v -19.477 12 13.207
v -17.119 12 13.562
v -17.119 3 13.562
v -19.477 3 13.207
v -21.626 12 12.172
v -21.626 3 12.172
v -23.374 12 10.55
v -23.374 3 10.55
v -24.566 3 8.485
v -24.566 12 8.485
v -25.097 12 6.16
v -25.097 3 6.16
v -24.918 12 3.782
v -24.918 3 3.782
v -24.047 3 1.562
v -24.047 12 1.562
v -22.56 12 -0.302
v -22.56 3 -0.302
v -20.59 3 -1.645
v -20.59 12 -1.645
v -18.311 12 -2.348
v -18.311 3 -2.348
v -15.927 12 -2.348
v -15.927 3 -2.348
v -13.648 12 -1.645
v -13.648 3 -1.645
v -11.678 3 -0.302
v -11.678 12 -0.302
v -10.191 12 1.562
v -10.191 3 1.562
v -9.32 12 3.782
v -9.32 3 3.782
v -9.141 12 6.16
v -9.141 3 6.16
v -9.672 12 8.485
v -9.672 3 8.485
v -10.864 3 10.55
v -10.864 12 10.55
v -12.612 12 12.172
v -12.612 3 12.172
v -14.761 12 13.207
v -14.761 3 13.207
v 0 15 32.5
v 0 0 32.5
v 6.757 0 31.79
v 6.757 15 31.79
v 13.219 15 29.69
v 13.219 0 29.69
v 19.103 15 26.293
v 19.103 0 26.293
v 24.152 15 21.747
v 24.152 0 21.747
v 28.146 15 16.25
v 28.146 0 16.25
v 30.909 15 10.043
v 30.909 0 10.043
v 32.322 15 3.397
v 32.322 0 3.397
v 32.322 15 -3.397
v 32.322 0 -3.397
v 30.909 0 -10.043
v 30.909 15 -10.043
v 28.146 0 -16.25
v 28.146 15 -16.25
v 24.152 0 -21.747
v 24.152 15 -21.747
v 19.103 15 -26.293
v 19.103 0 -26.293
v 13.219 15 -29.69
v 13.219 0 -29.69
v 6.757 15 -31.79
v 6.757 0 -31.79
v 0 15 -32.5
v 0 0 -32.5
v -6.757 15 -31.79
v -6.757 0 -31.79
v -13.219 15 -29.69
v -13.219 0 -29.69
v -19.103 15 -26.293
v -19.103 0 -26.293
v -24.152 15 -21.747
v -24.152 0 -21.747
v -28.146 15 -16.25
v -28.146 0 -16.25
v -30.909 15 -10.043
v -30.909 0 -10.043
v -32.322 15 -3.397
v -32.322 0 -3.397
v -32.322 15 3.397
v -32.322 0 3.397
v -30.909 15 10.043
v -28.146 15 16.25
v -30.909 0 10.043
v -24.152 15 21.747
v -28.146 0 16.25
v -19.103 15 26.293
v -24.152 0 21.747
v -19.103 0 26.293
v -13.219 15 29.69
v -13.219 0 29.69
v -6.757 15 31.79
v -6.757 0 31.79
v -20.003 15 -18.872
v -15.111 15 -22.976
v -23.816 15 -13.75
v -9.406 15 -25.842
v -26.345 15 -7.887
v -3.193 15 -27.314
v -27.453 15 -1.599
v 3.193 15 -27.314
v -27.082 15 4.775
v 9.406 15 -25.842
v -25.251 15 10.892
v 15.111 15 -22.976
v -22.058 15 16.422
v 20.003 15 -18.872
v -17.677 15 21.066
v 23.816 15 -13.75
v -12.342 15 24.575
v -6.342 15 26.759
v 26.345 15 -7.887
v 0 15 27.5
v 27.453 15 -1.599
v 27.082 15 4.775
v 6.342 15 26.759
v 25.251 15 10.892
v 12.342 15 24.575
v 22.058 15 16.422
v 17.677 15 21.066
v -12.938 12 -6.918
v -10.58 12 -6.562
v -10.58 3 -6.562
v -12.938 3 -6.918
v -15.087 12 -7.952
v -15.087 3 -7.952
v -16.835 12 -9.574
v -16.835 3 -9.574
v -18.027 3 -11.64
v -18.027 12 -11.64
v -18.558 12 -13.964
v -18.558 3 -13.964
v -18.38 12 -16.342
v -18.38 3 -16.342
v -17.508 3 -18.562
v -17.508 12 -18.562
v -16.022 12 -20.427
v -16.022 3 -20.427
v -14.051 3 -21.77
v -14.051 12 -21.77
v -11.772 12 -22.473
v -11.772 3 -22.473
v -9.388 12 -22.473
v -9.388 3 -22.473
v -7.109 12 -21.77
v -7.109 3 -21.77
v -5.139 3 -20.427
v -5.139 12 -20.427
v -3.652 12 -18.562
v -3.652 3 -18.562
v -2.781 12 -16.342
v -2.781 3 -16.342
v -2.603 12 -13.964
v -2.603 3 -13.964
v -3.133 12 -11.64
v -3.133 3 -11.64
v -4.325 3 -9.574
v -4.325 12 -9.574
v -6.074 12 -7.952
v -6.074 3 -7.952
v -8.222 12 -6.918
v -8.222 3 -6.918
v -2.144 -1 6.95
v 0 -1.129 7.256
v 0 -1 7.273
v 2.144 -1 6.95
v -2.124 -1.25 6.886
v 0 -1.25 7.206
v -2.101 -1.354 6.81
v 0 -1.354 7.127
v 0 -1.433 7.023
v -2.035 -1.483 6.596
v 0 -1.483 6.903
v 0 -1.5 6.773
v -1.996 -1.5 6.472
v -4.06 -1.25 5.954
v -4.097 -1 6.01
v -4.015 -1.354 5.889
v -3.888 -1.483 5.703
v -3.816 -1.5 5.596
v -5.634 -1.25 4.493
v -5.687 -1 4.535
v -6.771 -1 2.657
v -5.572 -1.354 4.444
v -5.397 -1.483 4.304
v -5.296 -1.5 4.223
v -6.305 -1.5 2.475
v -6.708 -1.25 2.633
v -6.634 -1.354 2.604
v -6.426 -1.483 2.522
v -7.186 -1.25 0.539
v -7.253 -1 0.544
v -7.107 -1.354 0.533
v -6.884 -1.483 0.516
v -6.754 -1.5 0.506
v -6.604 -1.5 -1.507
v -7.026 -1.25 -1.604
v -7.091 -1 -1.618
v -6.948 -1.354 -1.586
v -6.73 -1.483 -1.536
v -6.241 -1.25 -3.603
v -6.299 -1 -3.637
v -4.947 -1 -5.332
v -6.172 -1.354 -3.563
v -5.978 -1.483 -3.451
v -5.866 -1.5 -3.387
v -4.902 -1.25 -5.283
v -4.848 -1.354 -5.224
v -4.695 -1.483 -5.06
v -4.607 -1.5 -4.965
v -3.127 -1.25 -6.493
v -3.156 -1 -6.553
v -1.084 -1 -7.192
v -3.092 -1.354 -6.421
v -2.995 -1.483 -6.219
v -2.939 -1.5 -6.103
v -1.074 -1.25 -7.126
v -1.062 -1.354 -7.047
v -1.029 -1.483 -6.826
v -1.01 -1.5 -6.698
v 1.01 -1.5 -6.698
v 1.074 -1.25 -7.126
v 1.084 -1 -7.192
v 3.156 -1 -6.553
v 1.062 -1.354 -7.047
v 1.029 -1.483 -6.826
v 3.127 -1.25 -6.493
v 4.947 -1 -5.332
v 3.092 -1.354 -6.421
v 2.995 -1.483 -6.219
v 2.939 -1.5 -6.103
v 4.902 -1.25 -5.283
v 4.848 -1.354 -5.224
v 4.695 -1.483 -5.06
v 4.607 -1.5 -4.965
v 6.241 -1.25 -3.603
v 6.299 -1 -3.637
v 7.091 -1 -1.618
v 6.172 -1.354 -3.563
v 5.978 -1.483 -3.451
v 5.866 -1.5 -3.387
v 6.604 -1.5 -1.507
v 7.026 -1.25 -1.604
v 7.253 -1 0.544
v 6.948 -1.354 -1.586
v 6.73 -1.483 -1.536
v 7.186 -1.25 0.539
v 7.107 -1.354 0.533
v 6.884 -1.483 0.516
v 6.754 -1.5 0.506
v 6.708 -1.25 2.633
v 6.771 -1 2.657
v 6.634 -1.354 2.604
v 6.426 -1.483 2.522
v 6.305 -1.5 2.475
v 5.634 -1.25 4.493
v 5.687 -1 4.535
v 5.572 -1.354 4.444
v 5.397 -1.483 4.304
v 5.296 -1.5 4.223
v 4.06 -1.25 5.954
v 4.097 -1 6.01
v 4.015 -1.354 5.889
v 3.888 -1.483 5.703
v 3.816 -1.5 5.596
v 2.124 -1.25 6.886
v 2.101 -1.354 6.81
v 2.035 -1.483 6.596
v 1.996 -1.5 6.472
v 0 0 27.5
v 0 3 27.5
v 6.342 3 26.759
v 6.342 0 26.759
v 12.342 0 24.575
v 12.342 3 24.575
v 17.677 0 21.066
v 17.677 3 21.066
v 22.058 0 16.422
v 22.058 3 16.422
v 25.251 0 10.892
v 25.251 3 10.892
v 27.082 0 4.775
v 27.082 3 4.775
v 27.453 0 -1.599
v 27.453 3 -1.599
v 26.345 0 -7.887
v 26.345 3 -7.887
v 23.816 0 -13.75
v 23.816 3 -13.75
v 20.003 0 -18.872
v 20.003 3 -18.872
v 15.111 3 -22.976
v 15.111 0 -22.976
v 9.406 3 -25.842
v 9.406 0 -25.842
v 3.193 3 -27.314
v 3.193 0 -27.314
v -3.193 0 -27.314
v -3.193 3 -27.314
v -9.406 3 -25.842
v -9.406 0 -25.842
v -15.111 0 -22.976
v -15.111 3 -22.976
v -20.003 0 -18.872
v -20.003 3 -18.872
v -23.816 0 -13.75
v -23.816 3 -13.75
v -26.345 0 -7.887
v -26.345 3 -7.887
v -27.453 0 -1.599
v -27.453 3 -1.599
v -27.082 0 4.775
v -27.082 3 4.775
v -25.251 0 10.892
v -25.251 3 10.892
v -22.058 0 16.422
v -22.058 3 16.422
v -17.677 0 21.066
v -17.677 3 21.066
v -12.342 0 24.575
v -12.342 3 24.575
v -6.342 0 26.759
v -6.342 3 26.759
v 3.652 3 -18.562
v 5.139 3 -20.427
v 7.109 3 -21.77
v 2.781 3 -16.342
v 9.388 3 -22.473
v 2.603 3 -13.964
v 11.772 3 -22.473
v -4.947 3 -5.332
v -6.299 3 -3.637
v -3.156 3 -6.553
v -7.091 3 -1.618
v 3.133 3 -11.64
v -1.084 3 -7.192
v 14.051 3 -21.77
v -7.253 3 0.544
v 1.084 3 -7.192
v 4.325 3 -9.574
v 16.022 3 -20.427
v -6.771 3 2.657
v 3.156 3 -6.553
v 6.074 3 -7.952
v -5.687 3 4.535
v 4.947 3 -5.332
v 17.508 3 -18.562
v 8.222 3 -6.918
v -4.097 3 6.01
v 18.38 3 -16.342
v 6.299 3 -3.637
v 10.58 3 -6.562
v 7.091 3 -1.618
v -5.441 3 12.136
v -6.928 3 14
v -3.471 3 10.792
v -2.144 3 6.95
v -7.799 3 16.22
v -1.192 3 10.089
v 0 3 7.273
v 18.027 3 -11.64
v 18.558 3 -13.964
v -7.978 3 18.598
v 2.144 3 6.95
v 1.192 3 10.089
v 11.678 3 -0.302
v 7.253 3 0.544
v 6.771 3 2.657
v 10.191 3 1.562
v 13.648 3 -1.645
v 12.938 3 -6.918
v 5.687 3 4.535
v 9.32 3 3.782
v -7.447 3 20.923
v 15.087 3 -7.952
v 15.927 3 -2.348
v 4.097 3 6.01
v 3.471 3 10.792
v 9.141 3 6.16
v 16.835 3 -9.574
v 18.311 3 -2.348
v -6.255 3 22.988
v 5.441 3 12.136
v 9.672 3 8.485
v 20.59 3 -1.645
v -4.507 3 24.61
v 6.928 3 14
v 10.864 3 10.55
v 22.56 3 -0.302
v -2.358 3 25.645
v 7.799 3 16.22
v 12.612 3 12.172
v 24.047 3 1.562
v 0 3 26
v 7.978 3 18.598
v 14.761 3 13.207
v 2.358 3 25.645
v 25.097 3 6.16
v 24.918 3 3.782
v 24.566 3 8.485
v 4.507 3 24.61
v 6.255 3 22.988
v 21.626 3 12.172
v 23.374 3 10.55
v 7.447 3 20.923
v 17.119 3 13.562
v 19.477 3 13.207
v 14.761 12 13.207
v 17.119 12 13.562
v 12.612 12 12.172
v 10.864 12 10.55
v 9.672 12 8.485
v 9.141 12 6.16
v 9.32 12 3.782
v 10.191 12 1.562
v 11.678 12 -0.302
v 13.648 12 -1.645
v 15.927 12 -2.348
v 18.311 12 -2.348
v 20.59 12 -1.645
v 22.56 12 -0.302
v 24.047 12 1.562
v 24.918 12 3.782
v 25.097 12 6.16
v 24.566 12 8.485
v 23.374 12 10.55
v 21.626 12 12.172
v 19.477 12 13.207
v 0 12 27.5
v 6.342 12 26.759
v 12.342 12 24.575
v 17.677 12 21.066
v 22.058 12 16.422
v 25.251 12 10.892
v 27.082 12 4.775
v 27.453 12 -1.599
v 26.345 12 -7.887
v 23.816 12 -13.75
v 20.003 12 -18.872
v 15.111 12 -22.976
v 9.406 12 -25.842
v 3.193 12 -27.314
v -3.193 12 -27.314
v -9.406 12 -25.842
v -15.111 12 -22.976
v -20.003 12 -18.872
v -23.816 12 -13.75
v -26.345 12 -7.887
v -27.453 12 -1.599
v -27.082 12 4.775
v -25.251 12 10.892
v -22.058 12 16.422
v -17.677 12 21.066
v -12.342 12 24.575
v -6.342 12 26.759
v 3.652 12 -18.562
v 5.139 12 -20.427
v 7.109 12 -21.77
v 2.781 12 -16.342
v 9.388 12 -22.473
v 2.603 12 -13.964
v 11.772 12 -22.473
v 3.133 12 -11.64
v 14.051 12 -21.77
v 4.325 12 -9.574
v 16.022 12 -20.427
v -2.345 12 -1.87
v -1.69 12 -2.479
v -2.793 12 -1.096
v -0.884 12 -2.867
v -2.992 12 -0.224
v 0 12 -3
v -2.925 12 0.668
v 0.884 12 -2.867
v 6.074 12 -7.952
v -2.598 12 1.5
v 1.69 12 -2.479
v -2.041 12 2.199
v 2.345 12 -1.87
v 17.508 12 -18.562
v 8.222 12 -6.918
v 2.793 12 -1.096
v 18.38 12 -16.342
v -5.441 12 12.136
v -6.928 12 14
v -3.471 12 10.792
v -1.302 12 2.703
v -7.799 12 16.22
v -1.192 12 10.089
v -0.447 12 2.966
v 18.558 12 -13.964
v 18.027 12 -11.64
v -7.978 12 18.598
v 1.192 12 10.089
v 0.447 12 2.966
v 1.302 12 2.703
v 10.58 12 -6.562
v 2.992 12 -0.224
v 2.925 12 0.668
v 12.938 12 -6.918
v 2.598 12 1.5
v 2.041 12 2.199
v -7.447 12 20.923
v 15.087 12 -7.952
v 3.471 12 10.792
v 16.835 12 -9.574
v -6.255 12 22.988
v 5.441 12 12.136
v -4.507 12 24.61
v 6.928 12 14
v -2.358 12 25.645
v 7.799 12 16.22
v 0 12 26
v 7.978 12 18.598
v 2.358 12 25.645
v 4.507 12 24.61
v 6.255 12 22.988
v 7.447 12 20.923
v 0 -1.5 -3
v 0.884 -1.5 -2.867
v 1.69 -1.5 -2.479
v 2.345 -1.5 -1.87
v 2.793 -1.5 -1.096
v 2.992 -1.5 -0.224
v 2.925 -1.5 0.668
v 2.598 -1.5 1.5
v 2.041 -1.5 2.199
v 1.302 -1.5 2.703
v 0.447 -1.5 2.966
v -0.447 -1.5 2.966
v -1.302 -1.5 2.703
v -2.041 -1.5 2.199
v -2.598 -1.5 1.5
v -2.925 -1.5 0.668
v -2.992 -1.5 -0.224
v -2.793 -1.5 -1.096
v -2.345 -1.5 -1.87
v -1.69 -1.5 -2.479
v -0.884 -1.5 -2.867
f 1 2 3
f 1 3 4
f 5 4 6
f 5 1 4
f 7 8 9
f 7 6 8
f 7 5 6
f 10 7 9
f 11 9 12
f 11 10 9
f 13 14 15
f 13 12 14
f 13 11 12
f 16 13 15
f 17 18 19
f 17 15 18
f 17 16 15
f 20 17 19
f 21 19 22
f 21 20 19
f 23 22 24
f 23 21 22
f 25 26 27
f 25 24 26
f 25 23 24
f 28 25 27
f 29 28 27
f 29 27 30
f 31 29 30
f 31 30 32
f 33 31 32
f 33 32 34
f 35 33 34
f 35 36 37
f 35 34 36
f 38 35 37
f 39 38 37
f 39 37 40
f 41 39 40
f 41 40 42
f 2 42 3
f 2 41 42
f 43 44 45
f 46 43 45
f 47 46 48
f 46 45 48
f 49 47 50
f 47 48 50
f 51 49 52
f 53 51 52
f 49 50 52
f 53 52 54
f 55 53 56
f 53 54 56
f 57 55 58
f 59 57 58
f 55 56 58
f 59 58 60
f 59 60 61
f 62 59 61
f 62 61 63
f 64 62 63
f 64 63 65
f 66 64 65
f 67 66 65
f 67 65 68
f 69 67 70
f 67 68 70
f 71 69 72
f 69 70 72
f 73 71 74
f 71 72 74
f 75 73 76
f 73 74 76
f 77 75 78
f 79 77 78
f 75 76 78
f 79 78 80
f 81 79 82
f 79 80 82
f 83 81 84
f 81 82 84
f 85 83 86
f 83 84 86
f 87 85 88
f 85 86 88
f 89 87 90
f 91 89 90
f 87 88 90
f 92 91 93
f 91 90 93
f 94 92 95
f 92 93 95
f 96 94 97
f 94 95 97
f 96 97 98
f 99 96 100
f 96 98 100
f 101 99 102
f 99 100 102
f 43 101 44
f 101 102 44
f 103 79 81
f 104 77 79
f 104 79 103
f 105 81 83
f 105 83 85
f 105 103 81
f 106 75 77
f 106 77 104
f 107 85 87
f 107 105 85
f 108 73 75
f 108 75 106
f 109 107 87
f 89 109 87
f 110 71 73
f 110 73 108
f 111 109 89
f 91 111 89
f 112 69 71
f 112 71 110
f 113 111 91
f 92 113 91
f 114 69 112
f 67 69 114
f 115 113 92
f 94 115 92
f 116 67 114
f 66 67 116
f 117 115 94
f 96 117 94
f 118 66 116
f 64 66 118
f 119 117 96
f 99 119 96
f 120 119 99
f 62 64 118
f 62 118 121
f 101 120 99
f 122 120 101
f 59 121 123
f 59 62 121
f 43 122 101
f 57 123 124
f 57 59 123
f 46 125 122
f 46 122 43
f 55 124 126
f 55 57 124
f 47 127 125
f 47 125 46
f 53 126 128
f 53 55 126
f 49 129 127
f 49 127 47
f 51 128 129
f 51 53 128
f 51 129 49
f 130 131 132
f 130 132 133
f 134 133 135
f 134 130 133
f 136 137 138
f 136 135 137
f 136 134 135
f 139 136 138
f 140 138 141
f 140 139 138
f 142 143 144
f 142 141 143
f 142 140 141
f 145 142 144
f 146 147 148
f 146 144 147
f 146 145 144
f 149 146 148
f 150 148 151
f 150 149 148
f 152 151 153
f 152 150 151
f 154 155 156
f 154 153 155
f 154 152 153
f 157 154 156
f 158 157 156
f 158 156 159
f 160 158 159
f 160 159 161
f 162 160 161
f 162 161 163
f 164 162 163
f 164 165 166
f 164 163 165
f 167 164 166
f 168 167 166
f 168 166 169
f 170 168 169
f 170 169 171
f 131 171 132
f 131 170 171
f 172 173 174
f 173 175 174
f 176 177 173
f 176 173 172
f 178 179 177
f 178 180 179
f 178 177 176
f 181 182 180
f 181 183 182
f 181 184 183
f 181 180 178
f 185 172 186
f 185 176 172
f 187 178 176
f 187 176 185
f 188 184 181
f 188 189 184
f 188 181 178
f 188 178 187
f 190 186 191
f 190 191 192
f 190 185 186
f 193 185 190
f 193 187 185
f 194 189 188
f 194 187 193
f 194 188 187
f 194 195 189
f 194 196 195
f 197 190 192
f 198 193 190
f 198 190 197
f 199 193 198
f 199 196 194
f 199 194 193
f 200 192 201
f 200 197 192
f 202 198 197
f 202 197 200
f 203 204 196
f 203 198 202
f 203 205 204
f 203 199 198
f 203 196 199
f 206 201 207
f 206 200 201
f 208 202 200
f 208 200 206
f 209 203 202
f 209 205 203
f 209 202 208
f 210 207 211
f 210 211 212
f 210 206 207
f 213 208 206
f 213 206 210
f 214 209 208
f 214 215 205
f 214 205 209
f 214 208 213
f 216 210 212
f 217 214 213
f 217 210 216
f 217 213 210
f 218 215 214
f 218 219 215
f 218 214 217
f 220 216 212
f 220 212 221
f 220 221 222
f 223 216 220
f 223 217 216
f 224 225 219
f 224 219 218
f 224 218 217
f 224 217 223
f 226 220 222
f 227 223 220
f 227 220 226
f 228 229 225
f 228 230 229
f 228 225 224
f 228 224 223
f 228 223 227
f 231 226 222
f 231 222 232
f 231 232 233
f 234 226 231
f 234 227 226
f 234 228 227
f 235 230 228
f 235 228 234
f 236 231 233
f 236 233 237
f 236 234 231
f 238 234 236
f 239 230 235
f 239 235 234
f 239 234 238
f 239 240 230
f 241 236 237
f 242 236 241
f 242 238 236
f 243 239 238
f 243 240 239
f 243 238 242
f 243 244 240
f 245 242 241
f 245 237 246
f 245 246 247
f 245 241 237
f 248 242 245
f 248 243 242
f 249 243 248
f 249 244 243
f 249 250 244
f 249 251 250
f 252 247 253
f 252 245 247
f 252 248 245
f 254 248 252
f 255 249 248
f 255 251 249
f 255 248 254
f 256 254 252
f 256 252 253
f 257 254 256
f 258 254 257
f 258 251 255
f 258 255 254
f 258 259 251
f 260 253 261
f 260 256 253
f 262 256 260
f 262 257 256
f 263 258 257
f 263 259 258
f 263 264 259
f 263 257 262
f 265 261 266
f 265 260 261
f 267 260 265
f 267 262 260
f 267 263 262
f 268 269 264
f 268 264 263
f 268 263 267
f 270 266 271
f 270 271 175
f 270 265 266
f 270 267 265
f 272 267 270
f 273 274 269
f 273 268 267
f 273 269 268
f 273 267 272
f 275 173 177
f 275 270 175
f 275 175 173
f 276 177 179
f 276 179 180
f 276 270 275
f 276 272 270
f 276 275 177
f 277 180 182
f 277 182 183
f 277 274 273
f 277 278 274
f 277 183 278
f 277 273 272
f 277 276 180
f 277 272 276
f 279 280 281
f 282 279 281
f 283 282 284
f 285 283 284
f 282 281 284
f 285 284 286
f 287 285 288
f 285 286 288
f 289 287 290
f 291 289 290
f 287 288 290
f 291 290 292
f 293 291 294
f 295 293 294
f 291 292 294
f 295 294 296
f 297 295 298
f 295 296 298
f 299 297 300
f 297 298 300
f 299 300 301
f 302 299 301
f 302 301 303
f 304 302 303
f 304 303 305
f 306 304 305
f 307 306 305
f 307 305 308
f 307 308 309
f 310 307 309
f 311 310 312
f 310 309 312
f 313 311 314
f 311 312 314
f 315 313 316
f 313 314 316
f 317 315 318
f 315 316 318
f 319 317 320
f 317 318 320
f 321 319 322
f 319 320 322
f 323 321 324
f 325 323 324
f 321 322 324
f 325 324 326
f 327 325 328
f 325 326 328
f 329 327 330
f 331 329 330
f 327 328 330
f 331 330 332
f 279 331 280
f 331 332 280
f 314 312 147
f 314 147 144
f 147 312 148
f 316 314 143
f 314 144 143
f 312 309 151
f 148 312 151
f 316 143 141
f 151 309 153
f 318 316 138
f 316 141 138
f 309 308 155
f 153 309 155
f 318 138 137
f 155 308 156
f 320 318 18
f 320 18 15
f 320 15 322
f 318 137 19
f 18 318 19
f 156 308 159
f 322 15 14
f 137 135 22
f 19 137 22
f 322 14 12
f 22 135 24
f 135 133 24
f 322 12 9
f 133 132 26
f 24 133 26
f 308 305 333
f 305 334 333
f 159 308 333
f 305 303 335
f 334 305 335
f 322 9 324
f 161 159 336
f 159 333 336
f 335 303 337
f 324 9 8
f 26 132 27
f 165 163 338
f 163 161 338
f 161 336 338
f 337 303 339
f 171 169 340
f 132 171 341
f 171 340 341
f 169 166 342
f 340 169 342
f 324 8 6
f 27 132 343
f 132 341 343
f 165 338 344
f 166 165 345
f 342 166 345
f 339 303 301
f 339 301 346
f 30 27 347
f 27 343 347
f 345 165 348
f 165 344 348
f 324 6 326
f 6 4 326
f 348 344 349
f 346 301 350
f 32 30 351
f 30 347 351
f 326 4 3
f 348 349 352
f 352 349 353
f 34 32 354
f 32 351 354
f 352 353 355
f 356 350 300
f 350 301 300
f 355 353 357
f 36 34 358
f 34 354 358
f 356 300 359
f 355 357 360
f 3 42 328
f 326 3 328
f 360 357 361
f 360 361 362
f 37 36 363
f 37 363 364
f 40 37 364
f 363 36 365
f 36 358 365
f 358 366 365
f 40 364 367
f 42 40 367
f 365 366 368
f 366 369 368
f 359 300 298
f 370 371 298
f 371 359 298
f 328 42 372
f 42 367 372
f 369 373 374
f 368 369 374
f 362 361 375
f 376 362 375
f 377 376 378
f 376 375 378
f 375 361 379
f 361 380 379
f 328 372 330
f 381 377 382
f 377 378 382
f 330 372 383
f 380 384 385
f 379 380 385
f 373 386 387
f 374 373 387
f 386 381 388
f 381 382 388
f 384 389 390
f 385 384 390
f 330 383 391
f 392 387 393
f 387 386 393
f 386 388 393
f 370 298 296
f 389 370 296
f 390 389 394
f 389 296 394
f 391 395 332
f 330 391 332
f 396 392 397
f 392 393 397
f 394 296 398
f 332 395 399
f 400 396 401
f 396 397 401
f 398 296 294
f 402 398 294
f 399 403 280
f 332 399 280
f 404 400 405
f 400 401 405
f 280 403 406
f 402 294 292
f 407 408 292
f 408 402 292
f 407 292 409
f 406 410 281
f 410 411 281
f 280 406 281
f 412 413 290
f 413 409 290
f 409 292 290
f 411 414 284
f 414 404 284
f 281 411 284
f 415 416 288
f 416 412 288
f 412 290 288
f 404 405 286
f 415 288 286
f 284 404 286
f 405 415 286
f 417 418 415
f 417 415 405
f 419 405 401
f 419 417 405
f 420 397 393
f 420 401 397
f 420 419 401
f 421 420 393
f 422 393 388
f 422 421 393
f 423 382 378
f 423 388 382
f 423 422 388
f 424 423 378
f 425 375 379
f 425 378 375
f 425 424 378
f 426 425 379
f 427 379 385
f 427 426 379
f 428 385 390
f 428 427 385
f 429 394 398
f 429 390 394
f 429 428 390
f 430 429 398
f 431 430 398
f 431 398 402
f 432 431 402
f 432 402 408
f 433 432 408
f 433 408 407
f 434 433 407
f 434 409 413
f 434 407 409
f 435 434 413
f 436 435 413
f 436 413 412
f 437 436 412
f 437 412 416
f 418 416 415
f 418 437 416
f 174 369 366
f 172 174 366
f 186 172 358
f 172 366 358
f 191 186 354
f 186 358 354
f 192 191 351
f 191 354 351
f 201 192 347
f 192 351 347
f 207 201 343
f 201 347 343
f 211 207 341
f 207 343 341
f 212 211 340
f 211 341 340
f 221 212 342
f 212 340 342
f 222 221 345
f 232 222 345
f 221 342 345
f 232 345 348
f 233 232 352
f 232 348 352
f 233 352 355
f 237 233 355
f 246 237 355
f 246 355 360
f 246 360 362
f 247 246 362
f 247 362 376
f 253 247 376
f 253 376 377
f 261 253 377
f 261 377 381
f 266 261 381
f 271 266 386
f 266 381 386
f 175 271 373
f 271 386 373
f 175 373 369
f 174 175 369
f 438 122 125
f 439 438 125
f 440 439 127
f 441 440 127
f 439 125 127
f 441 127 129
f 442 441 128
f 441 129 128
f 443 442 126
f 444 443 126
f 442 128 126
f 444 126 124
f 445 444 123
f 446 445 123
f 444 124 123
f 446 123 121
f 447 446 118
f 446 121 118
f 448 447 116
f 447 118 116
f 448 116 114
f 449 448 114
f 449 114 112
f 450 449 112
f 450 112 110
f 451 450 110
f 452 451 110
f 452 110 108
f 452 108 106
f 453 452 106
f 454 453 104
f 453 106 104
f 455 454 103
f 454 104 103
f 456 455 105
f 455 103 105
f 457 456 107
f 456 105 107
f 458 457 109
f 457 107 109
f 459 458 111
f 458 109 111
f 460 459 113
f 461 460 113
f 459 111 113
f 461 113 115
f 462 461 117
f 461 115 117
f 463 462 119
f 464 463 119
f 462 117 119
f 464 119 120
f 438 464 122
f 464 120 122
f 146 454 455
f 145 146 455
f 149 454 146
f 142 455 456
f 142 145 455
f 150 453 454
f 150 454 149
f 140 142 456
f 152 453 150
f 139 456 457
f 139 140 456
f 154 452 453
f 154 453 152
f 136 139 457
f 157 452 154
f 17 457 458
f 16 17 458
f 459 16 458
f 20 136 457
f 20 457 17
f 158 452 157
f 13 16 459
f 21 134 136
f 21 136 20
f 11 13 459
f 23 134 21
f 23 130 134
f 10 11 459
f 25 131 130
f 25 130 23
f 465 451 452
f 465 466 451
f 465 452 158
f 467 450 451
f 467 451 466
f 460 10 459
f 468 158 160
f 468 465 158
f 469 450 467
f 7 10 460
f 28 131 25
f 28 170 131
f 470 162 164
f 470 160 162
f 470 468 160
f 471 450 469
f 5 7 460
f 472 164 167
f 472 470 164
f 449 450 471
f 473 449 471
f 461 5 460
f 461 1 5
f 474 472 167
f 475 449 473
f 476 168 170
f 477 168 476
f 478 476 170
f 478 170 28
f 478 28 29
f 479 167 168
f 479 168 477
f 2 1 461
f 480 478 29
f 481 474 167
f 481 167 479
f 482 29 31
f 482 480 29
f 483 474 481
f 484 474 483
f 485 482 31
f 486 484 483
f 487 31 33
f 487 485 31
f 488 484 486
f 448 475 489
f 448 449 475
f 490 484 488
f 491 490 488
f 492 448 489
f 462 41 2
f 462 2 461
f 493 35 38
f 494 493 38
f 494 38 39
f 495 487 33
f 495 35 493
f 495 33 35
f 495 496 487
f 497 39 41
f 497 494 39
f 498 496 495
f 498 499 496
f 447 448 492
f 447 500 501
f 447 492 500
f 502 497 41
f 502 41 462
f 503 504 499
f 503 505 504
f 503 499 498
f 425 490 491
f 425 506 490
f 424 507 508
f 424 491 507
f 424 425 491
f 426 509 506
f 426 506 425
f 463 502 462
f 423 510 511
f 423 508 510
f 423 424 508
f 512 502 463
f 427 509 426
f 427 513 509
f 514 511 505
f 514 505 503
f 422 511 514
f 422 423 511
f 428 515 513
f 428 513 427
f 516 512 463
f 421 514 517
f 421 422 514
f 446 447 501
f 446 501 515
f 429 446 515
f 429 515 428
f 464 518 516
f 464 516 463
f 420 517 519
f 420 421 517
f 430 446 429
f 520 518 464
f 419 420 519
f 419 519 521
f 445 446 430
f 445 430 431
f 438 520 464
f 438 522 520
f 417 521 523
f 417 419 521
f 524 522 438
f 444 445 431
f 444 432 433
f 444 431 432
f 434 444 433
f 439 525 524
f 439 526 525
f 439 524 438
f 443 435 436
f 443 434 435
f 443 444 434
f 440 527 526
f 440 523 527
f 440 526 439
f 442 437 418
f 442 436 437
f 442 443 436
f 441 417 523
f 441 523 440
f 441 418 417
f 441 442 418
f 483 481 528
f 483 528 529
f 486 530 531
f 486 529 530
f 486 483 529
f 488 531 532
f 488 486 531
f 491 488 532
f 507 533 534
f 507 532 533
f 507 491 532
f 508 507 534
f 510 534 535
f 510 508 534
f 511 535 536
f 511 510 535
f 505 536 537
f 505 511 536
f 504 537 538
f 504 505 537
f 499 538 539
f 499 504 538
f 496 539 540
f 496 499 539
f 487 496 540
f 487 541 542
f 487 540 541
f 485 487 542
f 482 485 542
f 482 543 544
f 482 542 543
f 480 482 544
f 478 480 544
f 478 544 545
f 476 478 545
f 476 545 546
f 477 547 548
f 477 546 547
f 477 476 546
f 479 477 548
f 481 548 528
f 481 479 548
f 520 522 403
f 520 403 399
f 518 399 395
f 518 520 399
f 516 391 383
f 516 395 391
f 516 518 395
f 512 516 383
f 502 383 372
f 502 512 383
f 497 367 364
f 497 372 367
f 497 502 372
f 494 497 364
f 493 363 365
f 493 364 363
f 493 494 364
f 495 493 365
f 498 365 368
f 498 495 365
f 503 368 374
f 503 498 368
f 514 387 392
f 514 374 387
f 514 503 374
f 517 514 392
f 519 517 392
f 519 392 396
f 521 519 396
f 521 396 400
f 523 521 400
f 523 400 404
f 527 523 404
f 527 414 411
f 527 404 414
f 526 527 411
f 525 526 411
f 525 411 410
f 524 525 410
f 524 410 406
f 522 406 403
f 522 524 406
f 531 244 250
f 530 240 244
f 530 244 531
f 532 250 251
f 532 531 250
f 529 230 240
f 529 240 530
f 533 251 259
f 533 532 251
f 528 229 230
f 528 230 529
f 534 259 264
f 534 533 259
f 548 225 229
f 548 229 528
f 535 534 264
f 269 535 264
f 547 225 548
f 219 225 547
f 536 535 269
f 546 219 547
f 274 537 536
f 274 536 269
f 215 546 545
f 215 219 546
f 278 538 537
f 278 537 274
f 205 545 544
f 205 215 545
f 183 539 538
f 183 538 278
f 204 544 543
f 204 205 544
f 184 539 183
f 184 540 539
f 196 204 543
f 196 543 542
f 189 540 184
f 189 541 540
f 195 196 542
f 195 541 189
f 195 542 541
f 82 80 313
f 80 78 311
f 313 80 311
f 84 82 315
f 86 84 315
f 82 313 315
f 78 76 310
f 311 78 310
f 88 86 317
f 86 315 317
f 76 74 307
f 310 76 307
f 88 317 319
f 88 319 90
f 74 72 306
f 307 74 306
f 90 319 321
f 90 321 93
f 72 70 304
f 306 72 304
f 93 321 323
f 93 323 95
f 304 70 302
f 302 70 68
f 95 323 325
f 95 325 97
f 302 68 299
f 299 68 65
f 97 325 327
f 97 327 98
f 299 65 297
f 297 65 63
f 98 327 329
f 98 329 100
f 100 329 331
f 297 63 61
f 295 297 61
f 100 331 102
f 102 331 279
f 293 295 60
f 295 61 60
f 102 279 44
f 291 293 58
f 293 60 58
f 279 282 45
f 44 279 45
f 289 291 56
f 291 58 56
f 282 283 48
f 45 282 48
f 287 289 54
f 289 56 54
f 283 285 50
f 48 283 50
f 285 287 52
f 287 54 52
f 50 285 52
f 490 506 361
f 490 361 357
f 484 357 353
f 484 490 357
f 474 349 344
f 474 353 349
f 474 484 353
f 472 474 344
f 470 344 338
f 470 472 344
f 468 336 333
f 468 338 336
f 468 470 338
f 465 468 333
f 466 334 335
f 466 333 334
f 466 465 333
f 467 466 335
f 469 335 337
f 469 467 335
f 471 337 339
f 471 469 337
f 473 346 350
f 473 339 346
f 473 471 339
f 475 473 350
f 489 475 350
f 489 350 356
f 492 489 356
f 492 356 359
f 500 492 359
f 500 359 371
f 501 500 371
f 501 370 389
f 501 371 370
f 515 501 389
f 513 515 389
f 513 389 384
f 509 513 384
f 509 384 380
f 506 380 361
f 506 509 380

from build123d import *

# Parameters (mm, degrees)
SKETCH2_R               = 32.5
BOSS_EXTRUDE1_DEPTH     = 15
SKETCH3_R               = 27.5
CUT_EXTRUDE1_DEPTH      = 3
CUT_EXTRUDE2_START      = -12
SKETCH3_2_R             = 27.5
CUT_EXTRUDE2_DEPTH      = 3
CUT_EXTRUDE3_DEPTH      = 48.502631506
CUT_EXTRUDE3_DEPTH_BACK = 48.502631506
SKETCH4_R               = 8
SKETCH5_R               = 7.273402988
BOSS_EXTRUDE2_DEPTH     = 4.5
FILLET3_R               = 0.5
CUT_EXTRUDE4_DEPTH      = 49.833902158
CUT_EXTRUDE4_DEPTH_BACK = 49.833902158
SKETCH6_R               = 3


with BuildPart() as part:
    # Sketch2 → Boss-Extrude1 (new body)
    with BuildSketch(Plane(origin=(0, 0, 0), x_dir=(1, 0, 0), z_dir=(0, 1, 0))):
        Circle(SKETCH2_R)
    extrude(amount=BOSS_EXTRUDE1_DEPTH)

    # Sketch3 → Cut-Extrude1 (cut)
    with BuildSketch(Plane(origin=(0, 15, 0), x_dir=(1, 0, 0), z_dir=(0, 1, 0))):
        Circle(SKETCH3_R)
    extrude(amount=-CUT_EXTRUDE1_DEPTH, mode=Mode.SUBTRACT)

    # Sketch3<2> → Cut-Extrude2 (cut)
    with BuildSketch(Plane(origin=(0, 15, 0), x_dir=(1, 0, 0), z_dir=(0, 1, 0)).offset(CUT_EXTRUDE2_START)):
        Circle(SKETCH3_2_R)
    extrude(amount=-CUT_EXTRUDE2_DEPTH, mode=Mode.SUBTRACT)

    # Sketch4 → Cut-Extrude3 (cut, two sides: drawn at the far end of the back side and taken through both)
    with BuildSketch(Plane.XZ.offset(-3).offset(-CUT_EXTRUDE3_DEPTH_BACK)):
        with Locations((0, 18)):
            Circle(SKETCH4_R)
        with Locations((17.119017293, 5.562305899)):
            Circle(SKETCH4_R)
        with Locations((10.580134541, -14.562305899)):
            Circle(SKETCH4_R)
        with Locations((-10.580134541, -14.562305899)):
            Circle(SKETCH4_R)
        with Locations((-17.119017293, 5.562305899)):
            Circle(SKETCH4_R)
    extrude(amount=CUT_EXTRUDE3_DEPTH + CUT_EXTRUDE3_DEPTH_BACK, mode=Mode.SUBTRACT)

    # Sketch5 → Boss-Extrude2 (add)
    with BuildSketch(Plane.XZ.offset(-3)):
        Circle(SKETCH5_R)
    extrude(amount=BOSS_EXTRUDE2_DEPTH)

    # Fillet3
    fillet3_edges = [part.edges().sort_by_distance(p)[0] for p in [
        (-7.273402988, -1.5, 0),
    ]]
    fillet(fillet3_edges, radius=FILLET3_R)

    # Sketch6 → Cut-Extrude4 (cut, two sides: drawn at the far end of the back side and taken through both)
    with BuildSketch(Plane.XZ.offset(1.5).offset(-CUT_EXTRUDE4_DEPTH_BACK)):
        Circle(SKETCH6_R)
    extrude(amount=CUT_EXTRUDE4_DEPTH + CUT_EXTRUDE4_DEPTH_BACK, mode=Mode.SUBTRACT)


solid = part.part
